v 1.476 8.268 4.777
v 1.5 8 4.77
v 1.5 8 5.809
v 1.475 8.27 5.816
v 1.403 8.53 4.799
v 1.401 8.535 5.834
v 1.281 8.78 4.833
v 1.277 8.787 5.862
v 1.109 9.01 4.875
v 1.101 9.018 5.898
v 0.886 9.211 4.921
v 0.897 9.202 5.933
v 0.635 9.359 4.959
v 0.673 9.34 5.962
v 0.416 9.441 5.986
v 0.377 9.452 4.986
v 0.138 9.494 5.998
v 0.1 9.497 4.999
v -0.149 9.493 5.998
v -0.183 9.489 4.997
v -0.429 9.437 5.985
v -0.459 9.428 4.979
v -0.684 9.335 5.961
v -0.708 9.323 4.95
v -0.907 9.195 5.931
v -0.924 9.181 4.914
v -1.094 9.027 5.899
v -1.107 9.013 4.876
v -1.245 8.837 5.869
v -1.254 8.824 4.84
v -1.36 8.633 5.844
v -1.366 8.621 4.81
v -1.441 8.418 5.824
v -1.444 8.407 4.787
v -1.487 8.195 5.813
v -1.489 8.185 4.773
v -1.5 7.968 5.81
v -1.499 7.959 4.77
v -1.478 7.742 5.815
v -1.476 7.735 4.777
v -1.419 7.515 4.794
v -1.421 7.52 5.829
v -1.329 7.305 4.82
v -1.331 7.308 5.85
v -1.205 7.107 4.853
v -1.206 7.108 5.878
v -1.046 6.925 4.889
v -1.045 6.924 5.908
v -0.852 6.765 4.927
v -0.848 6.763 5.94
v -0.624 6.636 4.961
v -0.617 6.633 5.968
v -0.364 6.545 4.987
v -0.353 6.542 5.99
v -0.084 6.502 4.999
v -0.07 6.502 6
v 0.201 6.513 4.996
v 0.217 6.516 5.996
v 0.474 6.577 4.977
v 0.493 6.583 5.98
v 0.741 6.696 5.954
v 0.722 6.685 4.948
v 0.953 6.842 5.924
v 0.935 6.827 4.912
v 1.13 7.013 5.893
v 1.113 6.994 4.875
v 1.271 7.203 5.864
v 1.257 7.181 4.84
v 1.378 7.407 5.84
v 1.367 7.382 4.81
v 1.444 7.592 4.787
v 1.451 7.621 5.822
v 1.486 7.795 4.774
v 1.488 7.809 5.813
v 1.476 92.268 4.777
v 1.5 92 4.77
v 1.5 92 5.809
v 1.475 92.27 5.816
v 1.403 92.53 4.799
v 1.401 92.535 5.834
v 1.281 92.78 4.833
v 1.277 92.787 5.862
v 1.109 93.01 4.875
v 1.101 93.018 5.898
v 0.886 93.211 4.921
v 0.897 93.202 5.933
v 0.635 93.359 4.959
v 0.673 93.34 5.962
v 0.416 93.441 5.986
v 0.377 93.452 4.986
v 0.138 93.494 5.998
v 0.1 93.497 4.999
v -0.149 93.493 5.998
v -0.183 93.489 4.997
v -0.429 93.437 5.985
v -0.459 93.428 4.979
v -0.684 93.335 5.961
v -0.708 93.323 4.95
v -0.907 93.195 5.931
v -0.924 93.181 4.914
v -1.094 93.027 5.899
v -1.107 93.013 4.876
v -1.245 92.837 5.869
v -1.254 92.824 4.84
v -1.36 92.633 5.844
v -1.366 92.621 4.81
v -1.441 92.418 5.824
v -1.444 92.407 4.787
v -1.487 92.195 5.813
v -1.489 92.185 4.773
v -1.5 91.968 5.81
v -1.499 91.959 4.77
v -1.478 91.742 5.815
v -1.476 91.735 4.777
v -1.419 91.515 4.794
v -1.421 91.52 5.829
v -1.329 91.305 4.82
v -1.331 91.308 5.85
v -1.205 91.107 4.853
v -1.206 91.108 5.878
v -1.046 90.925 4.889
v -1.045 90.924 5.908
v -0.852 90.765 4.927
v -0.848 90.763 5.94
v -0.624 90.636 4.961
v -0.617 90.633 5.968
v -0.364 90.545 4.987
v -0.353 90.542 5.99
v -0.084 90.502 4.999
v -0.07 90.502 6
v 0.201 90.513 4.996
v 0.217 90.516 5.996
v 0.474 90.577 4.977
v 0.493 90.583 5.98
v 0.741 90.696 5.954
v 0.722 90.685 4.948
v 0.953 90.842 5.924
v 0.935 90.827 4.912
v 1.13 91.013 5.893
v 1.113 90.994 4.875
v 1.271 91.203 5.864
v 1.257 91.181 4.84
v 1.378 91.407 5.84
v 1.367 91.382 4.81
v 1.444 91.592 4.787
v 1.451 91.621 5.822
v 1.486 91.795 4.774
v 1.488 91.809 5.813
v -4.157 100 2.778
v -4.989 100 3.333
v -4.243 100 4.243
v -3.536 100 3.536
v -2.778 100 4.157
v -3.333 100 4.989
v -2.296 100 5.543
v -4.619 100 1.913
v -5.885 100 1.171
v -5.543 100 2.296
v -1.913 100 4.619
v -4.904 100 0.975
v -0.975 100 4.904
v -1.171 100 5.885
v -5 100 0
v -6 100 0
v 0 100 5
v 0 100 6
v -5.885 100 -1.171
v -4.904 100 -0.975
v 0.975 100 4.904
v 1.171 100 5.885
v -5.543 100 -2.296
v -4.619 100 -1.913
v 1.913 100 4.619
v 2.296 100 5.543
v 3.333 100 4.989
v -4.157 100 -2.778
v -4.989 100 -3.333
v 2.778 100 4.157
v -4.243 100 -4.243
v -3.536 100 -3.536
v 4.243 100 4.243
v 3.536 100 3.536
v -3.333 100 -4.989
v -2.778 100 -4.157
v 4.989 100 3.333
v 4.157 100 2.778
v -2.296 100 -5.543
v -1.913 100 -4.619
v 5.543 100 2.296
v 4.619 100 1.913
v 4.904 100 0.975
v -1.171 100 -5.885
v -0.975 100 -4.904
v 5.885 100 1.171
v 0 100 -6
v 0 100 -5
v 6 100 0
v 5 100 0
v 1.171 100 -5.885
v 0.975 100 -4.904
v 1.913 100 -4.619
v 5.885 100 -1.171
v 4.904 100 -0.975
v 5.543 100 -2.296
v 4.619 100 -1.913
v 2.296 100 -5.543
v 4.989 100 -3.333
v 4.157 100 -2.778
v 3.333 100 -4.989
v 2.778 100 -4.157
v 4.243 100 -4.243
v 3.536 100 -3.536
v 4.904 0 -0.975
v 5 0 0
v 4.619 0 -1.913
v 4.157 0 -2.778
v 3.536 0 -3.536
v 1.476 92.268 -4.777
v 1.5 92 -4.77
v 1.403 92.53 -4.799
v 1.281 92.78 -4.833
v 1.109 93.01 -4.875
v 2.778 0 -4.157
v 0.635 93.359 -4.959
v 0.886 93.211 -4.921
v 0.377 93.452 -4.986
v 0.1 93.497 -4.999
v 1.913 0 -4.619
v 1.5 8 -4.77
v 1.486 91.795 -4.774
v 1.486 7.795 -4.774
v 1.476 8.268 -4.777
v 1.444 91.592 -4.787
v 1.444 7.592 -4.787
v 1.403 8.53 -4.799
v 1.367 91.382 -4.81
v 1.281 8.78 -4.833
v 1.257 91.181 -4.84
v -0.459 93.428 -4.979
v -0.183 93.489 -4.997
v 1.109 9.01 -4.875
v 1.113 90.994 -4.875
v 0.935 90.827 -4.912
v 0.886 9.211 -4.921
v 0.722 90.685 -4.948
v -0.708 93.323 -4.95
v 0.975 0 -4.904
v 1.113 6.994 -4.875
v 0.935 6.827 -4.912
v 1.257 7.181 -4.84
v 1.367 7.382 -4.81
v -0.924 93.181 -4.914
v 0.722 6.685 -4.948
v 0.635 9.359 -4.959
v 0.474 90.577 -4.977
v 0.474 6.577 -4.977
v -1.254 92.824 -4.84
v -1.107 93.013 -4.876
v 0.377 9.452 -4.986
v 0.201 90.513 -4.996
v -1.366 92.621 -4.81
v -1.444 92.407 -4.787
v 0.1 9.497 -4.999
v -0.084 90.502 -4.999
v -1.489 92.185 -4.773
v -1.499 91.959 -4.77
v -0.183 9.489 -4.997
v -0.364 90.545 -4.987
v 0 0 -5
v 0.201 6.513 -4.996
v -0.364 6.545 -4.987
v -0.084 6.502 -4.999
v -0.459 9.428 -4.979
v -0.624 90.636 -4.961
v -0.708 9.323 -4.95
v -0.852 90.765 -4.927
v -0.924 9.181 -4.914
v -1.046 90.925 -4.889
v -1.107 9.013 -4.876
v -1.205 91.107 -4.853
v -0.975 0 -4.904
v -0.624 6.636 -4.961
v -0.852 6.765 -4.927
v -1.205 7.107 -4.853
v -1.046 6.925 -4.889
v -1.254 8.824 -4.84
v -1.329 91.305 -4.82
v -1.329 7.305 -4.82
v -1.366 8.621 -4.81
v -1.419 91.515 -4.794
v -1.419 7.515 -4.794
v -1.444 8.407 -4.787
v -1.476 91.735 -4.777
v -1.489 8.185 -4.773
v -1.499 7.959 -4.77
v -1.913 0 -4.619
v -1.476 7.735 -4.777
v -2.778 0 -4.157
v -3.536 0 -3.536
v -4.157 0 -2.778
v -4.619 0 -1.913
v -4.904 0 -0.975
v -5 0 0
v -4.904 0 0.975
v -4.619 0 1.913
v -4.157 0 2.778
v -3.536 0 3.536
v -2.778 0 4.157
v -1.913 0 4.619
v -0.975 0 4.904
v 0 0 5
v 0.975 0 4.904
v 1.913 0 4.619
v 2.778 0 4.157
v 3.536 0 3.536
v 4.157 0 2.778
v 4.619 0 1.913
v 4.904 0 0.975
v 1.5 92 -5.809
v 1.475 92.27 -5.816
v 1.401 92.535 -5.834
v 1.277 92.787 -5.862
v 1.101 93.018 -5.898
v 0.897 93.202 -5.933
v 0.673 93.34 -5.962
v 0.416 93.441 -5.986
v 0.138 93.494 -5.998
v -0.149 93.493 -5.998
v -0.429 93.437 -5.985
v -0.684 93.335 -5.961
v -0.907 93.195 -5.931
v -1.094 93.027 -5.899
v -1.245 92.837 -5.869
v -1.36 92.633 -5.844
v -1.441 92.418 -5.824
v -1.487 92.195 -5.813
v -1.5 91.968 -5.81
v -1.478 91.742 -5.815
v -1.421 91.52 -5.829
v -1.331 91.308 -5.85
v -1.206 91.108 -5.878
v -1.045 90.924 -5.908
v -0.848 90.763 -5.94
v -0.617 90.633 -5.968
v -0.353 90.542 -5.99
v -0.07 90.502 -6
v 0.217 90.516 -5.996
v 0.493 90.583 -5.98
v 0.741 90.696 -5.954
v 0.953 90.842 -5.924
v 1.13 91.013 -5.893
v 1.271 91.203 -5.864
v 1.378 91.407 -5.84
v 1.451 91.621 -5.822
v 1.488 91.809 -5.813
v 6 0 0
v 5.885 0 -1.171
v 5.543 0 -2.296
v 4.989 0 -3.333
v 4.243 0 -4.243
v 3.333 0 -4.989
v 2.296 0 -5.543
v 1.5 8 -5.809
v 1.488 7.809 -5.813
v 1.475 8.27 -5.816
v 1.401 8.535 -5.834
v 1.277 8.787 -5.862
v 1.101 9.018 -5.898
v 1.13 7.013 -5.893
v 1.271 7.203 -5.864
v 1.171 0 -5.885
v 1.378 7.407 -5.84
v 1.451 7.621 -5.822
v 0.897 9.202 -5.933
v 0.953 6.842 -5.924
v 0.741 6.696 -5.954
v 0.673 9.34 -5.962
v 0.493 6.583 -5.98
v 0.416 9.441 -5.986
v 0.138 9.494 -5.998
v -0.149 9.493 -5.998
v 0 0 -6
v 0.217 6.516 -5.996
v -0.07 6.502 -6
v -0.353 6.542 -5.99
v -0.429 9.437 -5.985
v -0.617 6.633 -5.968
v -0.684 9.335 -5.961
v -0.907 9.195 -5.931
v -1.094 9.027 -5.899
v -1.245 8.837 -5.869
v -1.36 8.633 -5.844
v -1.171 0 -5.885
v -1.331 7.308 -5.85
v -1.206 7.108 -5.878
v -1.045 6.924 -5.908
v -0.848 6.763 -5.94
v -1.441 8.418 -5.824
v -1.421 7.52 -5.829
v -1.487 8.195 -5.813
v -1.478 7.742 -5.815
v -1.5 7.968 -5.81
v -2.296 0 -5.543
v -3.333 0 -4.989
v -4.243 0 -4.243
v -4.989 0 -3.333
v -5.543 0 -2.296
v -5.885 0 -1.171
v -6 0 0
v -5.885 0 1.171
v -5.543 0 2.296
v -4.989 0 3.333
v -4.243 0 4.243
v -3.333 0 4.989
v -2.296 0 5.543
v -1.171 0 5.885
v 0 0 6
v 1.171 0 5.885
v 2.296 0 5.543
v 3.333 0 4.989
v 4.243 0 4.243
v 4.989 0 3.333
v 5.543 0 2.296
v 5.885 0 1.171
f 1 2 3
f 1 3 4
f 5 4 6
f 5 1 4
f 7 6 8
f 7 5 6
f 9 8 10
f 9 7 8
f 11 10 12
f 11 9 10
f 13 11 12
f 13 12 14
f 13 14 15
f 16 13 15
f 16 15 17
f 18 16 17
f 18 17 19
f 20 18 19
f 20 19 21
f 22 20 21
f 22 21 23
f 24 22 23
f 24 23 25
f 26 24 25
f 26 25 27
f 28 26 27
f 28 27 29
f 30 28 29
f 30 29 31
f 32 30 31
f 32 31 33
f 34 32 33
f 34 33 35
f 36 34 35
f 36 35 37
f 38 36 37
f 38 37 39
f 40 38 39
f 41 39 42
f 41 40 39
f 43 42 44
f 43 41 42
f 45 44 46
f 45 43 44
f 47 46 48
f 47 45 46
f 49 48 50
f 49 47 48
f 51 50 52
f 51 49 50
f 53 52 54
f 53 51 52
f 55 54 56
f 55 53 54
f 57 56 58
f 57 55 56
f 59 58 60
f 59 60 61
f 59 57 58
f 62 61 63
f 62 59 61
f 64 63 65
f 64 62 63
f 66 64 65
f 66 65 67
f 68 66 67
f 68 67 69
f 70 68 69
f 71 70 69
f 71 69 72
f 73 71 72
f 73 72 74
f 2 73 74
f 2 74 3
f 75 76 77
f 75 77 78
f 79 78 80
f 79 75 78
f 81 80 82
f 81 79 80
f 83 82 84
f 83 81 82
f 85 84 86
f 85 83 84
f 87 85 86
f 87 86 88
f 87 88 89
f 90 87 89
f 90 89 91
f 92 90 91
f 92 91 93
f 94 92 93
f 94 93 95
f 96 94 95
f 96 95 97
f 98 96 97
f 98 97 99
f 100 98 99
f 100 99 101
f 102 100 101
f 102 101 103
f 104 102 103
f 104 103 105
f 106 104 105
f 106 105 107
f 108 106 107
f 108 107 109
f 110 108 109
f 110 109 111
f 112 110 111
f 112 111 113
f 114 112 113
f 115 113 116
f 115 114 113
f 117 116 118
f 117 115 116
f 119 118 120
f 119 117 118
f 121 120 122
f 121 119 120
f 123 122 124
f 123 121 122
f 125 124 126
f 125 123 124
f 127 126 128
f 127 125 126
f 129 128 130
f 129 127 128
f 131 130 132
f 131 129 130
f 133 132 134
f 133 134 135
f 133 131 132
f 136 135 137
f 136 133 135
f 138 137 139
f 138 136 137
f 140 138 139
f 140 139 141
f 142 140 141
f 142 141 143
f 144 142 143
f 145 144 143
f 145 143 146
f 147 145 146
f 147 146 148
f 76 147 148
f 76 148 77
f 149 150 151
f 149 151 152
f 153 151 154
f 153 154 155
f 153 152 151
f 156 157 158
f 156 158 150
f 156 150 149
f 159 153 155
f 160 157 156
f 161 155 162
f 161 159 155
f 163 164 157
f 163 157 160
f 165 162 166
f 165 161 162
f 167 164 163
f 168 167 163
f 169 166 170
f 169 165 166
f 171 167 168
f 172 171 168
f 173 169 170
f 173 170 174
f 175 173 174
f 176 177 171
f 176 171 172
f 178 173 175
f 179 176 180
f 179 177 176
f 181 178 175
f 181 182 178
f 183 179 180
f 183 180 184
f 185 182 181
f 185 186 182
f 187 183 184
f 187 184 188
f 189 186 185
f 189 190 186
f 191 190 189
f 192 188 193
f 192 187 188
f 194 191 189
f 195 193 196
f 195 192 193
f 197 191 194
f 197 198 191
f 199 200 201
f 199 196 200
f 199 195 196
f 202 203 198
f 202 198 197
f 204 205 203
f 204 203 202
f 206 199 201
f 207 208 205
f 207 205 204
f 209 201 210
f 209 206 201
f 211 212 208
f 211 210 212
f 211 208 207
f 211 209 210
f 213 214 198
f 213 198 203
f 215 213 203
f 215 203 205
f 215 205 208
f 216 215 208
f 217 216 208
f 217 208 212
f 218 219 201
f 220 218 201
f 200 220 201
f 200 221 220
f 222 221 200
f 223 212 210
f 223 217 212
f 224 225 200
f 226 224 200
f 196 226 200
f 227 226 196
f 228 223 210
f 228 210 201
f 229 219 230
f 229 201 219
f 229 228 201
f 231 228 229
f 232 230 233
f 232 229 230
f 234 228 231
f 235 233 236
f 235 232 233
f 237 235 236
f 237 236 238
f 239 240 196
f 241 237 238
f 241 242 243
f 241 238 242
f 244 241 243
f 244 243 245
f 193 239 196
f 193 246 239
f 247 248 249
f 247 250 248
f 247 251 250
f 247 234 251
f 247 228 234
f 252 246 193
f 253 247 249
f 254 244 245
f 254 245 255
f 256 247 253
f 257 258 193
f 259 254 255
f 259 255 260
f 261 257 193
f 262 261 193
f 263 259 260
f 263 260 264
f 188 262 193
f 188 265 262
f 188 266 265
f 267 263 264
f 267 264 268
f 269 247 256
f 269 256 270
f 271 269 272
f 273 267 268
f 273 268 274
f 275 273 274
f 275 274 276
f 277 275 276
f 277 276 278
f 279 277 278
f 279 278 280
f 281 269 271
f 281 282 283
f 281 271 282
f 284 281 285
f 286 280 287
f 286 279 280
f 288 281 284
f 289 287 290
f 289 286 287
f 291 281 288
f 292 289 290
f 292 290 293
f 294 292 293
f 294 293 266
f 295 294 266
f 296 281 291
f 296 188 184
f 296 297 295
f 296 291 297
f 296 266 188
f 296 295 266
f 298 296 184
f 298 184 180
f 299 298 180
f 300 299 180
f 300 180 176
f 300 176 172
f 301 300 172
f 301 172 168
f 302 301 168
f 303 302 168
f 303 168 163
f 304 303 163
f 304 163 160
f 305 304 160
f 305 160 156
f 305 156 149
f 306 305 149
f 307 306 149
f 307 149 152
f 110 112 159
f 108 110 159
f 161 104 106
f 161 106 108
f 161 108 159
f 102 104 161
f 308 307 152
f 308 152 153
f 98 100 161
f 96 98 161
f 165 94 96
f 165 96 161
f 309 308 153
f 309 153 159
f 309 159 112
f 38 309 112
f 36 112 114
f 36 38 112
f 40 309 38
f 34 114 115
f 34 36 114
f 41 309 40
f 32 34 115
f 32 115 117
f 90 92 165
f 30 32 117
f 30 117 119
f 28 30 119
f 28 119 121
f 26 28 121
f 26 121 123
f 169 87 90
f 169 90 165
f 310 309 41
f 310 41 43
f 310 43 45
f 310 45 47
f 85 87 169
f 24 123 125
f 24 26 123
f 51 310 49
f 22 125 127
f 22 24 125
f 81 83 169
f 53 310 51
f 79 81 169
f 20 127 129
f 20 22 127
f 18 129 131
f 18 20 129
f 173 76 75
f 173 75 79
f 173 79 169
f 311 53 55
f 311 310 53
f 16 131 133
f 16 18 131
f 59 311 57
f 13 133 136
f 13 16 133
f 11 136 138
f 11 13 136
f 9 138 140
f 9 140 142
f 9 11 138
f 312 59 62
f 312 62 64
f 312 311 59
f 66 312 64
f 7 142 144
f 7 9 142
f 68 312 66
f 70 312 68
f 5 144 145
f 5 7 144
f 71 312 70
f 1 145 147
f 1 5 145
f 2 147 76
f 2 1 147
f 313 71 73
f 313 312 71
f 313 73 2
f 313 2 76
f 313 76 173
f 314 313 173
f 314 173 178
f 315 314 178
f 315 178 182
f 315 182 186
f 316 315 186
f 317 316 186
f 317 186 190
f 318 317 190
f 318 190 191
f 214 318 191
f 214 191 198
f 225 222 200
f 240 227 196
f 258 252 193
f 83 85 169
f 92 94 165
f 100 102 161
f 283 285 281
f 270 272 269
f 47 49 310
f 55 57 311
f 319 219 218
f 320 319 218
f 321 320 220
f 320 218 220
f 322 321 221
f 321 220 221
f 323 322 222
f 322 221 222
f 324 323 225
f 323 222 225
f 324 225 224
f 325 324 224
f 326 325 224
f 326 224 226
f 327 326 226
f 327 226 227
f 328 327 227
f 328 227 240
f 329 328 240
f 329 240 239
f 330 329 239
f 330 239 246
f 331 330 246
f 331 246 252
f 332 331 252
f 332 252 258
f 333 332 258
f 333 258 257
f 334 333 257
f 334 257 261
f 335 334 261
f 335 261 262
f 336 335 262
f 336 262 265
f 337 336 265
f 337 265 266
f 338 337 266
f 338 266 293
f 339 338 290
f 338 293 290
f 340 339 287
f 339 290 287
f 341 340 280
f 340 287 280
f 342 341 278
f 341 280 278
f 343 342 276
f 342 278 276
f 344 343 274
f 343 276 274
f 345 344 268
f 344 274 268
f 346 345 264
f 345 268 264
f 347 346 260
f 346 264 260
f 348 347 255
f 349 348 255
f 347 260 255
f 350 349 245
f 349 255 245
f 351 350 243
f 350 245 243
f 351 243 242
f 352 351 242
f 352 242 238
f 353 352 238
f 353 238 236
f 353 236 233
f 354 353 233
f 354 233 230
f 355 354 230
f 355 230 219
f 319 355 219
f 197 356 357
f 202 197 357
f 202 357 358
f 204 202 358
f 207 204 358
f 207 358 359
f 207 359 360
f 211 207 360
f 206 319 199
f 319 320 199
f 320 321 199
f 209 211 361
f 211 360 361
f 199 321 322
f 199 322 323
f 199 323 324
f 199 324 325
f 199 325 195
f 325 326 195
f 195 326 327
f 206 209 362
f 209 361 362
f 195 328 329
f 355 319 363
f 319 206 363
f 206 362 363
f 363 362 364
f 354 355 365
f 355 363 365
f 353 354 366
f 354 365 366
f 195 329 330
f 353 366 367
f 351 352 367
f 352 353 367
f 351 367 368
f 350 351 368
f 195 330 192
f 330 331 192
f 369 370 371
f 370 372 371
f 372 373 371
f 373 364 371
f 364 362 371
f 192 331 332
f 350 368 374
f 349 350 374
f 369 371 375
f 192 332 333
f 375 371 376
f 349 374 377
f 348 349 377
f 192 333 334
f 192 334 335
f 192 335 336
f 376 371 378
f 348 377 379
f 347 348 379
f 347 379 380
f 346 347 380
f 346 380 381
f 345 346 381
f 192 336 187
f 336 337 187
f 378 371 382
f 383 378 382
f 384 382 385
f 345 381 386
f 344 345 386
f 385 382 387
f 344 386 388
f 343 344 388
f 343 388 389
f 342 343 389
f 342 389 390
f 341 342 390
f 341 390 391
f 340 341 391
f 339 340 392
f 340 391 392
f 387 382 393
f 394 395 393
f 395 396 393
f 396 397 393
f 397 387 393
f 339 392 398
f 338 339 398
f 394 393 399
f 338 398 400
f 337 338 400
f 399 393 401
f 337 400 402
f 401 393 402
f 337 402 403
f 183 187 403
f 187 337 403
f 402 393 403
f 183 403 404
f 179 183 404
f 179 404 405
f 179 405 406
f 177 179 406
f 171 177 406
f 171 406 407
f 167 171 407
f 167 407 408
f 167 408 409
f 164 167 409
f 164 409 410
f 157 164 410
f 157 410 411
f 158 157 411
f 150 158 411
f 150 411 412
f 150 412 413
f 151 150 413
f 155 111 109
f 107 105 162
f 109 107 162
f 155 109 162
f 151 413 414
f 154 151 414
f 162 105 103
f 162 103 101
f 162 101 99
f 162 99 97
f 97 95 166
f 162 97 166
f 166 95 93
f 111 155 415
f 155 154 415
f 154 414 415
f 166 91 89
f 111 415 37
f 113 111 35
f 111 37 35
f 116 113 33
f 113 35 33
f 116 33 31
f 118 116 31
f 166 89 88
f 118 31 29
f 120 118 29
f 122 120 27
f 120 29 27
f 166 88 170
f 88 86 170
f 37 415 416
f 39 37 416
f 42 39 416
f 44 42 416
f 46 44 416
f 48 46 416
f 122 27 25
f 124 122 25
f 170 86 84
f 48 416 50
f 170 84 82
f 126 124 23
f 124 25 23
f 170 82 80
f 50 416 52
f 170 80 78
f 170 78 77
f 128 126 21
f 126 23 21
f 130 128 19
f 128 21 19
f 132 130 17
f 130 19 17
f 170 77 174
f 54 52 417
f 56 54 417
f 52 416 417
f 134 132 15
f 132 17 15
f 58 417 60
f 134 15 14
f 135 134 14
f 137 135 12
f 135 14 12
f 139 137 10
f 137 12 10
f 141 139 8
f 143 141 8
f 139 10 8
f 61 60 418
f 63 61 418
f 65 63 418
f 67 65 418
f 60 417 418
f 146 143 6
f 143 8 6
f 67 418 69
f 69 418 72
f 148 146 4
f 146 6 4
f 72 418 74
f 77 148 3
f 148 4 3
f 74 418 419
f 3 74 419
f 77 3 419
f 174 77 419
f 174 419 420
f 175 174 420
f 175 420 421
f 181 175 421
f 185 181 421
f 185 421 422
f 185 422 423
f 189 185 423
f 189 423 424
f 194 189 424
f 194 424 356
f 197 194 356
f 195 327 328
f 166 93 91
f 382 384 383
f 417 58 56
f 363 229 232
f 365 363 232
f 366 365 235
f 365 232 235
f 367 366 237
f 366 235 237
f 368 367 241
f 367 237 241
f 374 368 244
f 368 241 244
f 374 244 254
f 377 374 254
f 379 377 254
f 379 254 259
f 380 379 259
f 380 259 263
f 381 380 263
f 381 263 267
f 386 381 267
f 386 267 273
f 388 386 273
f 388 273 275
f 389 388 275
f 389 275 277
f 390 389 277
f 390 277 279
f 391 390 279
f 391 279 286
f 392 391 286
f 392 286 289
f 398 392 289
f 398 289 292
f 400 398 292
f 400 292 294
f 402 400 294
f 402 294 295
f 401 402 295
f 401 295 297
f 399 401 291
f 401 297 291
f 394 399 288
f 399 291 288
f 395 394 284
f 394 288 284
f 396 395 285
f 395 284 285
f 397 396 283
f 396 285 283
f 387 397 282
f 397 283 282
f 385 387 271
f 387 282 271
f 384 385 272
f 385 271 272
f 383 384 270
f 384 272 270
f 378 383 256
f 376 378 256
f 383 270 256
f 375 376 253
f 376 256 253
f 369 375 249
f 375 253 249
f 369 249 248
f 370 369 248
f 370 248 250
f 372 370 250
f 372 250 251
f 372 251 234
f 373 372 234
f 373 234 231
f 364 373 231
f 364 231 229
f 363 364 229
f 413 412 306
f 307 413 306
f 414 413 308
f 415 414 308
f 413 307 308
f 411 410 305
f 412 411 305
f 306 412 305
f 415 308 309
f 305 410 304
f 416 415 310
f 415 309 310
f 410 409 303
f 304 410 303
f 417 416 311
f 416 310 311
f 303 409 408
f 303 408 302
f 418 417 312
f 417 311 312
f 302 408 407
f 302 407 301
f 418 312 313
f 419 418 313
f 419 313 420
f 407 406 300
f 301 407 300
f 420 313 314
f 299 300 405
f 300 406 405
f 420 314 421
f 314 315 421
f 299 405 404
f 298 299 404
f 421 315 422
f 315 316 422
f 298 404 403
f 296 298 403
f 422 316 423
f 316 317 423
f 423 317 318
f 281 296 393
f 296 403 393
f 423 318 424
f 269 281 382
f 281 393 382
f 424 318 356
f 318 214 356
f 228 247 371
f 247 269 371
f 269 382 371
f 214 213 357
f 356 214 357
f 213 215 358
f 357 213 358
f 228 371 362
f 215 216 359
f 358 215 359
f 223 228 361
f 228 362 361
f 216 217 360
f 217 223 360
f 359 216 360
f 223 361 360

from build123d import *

# Parameters (mm, degrees)
SKETCH1_R               = 6
SKETCH1_R_2             = 5
EXTRUDE_THIN1_DEPTH     = 100
SKETCH2_R               = 1.5
CUT_EXTRUDE2_DEPTH      = 7
CUT_EXTRUDE2_DEPTH_BACK = 7
SKETCH3_R               = 1.5
CUT_EXTRUDE3_DEPTH      = 7.000000127
CUT_EXTRUDE3_DEPTH_BACK = 7.000000127


with BuildPart() as part:
    # Sketch1 → Extrude-Thin1 (new body)
    with BuildSketch(Plane(origin=(0, 0, 0), x_dir=(1, 0, 0), z_dir=(0, 1, 0))):
        Circle(SKETCH1_R)
        Circle(SKETCH1_R_2, mode=Mode.SUBTRACT)
    extrude(amount=EXTRUDE_THIN1_DEPTH)

    # Sketch2 → Cut-Extrude2 (cut, two sides)
    with BuildSketch(Plane.XY) as cut_extrude2_sk:
        with Locations((0, 8)):
            Circle(SKETCH2_R)
    extrude(amount=CUT_EXTRUDE2_DEPTH, mode=Mode.SUBTRACT)
    extrude(cut_extrude2_sk.sketch, amount=-CUT_EXTRUDE2_DEPTH_BACK, mode=Mode.SUBTRACT)

    # Sketch3 → Cut-Extrude3 (cut, two sides)
    with BuildSketch(Plane.XY) as cut_extrude3_sk:
        with Locations((0, 92)):
            Circle(SKETCH3_R)
    extrude(amount=CUT_EXTRUDE3_DEPTH, mode=Mode.SUBTRACT)
    extrude(cut_extrude3_sk.sketch, amount=-CUT_EXTRUDE3_DEPTH_BACK, mode=Mode.SUBTRACT)


solid = part.part
